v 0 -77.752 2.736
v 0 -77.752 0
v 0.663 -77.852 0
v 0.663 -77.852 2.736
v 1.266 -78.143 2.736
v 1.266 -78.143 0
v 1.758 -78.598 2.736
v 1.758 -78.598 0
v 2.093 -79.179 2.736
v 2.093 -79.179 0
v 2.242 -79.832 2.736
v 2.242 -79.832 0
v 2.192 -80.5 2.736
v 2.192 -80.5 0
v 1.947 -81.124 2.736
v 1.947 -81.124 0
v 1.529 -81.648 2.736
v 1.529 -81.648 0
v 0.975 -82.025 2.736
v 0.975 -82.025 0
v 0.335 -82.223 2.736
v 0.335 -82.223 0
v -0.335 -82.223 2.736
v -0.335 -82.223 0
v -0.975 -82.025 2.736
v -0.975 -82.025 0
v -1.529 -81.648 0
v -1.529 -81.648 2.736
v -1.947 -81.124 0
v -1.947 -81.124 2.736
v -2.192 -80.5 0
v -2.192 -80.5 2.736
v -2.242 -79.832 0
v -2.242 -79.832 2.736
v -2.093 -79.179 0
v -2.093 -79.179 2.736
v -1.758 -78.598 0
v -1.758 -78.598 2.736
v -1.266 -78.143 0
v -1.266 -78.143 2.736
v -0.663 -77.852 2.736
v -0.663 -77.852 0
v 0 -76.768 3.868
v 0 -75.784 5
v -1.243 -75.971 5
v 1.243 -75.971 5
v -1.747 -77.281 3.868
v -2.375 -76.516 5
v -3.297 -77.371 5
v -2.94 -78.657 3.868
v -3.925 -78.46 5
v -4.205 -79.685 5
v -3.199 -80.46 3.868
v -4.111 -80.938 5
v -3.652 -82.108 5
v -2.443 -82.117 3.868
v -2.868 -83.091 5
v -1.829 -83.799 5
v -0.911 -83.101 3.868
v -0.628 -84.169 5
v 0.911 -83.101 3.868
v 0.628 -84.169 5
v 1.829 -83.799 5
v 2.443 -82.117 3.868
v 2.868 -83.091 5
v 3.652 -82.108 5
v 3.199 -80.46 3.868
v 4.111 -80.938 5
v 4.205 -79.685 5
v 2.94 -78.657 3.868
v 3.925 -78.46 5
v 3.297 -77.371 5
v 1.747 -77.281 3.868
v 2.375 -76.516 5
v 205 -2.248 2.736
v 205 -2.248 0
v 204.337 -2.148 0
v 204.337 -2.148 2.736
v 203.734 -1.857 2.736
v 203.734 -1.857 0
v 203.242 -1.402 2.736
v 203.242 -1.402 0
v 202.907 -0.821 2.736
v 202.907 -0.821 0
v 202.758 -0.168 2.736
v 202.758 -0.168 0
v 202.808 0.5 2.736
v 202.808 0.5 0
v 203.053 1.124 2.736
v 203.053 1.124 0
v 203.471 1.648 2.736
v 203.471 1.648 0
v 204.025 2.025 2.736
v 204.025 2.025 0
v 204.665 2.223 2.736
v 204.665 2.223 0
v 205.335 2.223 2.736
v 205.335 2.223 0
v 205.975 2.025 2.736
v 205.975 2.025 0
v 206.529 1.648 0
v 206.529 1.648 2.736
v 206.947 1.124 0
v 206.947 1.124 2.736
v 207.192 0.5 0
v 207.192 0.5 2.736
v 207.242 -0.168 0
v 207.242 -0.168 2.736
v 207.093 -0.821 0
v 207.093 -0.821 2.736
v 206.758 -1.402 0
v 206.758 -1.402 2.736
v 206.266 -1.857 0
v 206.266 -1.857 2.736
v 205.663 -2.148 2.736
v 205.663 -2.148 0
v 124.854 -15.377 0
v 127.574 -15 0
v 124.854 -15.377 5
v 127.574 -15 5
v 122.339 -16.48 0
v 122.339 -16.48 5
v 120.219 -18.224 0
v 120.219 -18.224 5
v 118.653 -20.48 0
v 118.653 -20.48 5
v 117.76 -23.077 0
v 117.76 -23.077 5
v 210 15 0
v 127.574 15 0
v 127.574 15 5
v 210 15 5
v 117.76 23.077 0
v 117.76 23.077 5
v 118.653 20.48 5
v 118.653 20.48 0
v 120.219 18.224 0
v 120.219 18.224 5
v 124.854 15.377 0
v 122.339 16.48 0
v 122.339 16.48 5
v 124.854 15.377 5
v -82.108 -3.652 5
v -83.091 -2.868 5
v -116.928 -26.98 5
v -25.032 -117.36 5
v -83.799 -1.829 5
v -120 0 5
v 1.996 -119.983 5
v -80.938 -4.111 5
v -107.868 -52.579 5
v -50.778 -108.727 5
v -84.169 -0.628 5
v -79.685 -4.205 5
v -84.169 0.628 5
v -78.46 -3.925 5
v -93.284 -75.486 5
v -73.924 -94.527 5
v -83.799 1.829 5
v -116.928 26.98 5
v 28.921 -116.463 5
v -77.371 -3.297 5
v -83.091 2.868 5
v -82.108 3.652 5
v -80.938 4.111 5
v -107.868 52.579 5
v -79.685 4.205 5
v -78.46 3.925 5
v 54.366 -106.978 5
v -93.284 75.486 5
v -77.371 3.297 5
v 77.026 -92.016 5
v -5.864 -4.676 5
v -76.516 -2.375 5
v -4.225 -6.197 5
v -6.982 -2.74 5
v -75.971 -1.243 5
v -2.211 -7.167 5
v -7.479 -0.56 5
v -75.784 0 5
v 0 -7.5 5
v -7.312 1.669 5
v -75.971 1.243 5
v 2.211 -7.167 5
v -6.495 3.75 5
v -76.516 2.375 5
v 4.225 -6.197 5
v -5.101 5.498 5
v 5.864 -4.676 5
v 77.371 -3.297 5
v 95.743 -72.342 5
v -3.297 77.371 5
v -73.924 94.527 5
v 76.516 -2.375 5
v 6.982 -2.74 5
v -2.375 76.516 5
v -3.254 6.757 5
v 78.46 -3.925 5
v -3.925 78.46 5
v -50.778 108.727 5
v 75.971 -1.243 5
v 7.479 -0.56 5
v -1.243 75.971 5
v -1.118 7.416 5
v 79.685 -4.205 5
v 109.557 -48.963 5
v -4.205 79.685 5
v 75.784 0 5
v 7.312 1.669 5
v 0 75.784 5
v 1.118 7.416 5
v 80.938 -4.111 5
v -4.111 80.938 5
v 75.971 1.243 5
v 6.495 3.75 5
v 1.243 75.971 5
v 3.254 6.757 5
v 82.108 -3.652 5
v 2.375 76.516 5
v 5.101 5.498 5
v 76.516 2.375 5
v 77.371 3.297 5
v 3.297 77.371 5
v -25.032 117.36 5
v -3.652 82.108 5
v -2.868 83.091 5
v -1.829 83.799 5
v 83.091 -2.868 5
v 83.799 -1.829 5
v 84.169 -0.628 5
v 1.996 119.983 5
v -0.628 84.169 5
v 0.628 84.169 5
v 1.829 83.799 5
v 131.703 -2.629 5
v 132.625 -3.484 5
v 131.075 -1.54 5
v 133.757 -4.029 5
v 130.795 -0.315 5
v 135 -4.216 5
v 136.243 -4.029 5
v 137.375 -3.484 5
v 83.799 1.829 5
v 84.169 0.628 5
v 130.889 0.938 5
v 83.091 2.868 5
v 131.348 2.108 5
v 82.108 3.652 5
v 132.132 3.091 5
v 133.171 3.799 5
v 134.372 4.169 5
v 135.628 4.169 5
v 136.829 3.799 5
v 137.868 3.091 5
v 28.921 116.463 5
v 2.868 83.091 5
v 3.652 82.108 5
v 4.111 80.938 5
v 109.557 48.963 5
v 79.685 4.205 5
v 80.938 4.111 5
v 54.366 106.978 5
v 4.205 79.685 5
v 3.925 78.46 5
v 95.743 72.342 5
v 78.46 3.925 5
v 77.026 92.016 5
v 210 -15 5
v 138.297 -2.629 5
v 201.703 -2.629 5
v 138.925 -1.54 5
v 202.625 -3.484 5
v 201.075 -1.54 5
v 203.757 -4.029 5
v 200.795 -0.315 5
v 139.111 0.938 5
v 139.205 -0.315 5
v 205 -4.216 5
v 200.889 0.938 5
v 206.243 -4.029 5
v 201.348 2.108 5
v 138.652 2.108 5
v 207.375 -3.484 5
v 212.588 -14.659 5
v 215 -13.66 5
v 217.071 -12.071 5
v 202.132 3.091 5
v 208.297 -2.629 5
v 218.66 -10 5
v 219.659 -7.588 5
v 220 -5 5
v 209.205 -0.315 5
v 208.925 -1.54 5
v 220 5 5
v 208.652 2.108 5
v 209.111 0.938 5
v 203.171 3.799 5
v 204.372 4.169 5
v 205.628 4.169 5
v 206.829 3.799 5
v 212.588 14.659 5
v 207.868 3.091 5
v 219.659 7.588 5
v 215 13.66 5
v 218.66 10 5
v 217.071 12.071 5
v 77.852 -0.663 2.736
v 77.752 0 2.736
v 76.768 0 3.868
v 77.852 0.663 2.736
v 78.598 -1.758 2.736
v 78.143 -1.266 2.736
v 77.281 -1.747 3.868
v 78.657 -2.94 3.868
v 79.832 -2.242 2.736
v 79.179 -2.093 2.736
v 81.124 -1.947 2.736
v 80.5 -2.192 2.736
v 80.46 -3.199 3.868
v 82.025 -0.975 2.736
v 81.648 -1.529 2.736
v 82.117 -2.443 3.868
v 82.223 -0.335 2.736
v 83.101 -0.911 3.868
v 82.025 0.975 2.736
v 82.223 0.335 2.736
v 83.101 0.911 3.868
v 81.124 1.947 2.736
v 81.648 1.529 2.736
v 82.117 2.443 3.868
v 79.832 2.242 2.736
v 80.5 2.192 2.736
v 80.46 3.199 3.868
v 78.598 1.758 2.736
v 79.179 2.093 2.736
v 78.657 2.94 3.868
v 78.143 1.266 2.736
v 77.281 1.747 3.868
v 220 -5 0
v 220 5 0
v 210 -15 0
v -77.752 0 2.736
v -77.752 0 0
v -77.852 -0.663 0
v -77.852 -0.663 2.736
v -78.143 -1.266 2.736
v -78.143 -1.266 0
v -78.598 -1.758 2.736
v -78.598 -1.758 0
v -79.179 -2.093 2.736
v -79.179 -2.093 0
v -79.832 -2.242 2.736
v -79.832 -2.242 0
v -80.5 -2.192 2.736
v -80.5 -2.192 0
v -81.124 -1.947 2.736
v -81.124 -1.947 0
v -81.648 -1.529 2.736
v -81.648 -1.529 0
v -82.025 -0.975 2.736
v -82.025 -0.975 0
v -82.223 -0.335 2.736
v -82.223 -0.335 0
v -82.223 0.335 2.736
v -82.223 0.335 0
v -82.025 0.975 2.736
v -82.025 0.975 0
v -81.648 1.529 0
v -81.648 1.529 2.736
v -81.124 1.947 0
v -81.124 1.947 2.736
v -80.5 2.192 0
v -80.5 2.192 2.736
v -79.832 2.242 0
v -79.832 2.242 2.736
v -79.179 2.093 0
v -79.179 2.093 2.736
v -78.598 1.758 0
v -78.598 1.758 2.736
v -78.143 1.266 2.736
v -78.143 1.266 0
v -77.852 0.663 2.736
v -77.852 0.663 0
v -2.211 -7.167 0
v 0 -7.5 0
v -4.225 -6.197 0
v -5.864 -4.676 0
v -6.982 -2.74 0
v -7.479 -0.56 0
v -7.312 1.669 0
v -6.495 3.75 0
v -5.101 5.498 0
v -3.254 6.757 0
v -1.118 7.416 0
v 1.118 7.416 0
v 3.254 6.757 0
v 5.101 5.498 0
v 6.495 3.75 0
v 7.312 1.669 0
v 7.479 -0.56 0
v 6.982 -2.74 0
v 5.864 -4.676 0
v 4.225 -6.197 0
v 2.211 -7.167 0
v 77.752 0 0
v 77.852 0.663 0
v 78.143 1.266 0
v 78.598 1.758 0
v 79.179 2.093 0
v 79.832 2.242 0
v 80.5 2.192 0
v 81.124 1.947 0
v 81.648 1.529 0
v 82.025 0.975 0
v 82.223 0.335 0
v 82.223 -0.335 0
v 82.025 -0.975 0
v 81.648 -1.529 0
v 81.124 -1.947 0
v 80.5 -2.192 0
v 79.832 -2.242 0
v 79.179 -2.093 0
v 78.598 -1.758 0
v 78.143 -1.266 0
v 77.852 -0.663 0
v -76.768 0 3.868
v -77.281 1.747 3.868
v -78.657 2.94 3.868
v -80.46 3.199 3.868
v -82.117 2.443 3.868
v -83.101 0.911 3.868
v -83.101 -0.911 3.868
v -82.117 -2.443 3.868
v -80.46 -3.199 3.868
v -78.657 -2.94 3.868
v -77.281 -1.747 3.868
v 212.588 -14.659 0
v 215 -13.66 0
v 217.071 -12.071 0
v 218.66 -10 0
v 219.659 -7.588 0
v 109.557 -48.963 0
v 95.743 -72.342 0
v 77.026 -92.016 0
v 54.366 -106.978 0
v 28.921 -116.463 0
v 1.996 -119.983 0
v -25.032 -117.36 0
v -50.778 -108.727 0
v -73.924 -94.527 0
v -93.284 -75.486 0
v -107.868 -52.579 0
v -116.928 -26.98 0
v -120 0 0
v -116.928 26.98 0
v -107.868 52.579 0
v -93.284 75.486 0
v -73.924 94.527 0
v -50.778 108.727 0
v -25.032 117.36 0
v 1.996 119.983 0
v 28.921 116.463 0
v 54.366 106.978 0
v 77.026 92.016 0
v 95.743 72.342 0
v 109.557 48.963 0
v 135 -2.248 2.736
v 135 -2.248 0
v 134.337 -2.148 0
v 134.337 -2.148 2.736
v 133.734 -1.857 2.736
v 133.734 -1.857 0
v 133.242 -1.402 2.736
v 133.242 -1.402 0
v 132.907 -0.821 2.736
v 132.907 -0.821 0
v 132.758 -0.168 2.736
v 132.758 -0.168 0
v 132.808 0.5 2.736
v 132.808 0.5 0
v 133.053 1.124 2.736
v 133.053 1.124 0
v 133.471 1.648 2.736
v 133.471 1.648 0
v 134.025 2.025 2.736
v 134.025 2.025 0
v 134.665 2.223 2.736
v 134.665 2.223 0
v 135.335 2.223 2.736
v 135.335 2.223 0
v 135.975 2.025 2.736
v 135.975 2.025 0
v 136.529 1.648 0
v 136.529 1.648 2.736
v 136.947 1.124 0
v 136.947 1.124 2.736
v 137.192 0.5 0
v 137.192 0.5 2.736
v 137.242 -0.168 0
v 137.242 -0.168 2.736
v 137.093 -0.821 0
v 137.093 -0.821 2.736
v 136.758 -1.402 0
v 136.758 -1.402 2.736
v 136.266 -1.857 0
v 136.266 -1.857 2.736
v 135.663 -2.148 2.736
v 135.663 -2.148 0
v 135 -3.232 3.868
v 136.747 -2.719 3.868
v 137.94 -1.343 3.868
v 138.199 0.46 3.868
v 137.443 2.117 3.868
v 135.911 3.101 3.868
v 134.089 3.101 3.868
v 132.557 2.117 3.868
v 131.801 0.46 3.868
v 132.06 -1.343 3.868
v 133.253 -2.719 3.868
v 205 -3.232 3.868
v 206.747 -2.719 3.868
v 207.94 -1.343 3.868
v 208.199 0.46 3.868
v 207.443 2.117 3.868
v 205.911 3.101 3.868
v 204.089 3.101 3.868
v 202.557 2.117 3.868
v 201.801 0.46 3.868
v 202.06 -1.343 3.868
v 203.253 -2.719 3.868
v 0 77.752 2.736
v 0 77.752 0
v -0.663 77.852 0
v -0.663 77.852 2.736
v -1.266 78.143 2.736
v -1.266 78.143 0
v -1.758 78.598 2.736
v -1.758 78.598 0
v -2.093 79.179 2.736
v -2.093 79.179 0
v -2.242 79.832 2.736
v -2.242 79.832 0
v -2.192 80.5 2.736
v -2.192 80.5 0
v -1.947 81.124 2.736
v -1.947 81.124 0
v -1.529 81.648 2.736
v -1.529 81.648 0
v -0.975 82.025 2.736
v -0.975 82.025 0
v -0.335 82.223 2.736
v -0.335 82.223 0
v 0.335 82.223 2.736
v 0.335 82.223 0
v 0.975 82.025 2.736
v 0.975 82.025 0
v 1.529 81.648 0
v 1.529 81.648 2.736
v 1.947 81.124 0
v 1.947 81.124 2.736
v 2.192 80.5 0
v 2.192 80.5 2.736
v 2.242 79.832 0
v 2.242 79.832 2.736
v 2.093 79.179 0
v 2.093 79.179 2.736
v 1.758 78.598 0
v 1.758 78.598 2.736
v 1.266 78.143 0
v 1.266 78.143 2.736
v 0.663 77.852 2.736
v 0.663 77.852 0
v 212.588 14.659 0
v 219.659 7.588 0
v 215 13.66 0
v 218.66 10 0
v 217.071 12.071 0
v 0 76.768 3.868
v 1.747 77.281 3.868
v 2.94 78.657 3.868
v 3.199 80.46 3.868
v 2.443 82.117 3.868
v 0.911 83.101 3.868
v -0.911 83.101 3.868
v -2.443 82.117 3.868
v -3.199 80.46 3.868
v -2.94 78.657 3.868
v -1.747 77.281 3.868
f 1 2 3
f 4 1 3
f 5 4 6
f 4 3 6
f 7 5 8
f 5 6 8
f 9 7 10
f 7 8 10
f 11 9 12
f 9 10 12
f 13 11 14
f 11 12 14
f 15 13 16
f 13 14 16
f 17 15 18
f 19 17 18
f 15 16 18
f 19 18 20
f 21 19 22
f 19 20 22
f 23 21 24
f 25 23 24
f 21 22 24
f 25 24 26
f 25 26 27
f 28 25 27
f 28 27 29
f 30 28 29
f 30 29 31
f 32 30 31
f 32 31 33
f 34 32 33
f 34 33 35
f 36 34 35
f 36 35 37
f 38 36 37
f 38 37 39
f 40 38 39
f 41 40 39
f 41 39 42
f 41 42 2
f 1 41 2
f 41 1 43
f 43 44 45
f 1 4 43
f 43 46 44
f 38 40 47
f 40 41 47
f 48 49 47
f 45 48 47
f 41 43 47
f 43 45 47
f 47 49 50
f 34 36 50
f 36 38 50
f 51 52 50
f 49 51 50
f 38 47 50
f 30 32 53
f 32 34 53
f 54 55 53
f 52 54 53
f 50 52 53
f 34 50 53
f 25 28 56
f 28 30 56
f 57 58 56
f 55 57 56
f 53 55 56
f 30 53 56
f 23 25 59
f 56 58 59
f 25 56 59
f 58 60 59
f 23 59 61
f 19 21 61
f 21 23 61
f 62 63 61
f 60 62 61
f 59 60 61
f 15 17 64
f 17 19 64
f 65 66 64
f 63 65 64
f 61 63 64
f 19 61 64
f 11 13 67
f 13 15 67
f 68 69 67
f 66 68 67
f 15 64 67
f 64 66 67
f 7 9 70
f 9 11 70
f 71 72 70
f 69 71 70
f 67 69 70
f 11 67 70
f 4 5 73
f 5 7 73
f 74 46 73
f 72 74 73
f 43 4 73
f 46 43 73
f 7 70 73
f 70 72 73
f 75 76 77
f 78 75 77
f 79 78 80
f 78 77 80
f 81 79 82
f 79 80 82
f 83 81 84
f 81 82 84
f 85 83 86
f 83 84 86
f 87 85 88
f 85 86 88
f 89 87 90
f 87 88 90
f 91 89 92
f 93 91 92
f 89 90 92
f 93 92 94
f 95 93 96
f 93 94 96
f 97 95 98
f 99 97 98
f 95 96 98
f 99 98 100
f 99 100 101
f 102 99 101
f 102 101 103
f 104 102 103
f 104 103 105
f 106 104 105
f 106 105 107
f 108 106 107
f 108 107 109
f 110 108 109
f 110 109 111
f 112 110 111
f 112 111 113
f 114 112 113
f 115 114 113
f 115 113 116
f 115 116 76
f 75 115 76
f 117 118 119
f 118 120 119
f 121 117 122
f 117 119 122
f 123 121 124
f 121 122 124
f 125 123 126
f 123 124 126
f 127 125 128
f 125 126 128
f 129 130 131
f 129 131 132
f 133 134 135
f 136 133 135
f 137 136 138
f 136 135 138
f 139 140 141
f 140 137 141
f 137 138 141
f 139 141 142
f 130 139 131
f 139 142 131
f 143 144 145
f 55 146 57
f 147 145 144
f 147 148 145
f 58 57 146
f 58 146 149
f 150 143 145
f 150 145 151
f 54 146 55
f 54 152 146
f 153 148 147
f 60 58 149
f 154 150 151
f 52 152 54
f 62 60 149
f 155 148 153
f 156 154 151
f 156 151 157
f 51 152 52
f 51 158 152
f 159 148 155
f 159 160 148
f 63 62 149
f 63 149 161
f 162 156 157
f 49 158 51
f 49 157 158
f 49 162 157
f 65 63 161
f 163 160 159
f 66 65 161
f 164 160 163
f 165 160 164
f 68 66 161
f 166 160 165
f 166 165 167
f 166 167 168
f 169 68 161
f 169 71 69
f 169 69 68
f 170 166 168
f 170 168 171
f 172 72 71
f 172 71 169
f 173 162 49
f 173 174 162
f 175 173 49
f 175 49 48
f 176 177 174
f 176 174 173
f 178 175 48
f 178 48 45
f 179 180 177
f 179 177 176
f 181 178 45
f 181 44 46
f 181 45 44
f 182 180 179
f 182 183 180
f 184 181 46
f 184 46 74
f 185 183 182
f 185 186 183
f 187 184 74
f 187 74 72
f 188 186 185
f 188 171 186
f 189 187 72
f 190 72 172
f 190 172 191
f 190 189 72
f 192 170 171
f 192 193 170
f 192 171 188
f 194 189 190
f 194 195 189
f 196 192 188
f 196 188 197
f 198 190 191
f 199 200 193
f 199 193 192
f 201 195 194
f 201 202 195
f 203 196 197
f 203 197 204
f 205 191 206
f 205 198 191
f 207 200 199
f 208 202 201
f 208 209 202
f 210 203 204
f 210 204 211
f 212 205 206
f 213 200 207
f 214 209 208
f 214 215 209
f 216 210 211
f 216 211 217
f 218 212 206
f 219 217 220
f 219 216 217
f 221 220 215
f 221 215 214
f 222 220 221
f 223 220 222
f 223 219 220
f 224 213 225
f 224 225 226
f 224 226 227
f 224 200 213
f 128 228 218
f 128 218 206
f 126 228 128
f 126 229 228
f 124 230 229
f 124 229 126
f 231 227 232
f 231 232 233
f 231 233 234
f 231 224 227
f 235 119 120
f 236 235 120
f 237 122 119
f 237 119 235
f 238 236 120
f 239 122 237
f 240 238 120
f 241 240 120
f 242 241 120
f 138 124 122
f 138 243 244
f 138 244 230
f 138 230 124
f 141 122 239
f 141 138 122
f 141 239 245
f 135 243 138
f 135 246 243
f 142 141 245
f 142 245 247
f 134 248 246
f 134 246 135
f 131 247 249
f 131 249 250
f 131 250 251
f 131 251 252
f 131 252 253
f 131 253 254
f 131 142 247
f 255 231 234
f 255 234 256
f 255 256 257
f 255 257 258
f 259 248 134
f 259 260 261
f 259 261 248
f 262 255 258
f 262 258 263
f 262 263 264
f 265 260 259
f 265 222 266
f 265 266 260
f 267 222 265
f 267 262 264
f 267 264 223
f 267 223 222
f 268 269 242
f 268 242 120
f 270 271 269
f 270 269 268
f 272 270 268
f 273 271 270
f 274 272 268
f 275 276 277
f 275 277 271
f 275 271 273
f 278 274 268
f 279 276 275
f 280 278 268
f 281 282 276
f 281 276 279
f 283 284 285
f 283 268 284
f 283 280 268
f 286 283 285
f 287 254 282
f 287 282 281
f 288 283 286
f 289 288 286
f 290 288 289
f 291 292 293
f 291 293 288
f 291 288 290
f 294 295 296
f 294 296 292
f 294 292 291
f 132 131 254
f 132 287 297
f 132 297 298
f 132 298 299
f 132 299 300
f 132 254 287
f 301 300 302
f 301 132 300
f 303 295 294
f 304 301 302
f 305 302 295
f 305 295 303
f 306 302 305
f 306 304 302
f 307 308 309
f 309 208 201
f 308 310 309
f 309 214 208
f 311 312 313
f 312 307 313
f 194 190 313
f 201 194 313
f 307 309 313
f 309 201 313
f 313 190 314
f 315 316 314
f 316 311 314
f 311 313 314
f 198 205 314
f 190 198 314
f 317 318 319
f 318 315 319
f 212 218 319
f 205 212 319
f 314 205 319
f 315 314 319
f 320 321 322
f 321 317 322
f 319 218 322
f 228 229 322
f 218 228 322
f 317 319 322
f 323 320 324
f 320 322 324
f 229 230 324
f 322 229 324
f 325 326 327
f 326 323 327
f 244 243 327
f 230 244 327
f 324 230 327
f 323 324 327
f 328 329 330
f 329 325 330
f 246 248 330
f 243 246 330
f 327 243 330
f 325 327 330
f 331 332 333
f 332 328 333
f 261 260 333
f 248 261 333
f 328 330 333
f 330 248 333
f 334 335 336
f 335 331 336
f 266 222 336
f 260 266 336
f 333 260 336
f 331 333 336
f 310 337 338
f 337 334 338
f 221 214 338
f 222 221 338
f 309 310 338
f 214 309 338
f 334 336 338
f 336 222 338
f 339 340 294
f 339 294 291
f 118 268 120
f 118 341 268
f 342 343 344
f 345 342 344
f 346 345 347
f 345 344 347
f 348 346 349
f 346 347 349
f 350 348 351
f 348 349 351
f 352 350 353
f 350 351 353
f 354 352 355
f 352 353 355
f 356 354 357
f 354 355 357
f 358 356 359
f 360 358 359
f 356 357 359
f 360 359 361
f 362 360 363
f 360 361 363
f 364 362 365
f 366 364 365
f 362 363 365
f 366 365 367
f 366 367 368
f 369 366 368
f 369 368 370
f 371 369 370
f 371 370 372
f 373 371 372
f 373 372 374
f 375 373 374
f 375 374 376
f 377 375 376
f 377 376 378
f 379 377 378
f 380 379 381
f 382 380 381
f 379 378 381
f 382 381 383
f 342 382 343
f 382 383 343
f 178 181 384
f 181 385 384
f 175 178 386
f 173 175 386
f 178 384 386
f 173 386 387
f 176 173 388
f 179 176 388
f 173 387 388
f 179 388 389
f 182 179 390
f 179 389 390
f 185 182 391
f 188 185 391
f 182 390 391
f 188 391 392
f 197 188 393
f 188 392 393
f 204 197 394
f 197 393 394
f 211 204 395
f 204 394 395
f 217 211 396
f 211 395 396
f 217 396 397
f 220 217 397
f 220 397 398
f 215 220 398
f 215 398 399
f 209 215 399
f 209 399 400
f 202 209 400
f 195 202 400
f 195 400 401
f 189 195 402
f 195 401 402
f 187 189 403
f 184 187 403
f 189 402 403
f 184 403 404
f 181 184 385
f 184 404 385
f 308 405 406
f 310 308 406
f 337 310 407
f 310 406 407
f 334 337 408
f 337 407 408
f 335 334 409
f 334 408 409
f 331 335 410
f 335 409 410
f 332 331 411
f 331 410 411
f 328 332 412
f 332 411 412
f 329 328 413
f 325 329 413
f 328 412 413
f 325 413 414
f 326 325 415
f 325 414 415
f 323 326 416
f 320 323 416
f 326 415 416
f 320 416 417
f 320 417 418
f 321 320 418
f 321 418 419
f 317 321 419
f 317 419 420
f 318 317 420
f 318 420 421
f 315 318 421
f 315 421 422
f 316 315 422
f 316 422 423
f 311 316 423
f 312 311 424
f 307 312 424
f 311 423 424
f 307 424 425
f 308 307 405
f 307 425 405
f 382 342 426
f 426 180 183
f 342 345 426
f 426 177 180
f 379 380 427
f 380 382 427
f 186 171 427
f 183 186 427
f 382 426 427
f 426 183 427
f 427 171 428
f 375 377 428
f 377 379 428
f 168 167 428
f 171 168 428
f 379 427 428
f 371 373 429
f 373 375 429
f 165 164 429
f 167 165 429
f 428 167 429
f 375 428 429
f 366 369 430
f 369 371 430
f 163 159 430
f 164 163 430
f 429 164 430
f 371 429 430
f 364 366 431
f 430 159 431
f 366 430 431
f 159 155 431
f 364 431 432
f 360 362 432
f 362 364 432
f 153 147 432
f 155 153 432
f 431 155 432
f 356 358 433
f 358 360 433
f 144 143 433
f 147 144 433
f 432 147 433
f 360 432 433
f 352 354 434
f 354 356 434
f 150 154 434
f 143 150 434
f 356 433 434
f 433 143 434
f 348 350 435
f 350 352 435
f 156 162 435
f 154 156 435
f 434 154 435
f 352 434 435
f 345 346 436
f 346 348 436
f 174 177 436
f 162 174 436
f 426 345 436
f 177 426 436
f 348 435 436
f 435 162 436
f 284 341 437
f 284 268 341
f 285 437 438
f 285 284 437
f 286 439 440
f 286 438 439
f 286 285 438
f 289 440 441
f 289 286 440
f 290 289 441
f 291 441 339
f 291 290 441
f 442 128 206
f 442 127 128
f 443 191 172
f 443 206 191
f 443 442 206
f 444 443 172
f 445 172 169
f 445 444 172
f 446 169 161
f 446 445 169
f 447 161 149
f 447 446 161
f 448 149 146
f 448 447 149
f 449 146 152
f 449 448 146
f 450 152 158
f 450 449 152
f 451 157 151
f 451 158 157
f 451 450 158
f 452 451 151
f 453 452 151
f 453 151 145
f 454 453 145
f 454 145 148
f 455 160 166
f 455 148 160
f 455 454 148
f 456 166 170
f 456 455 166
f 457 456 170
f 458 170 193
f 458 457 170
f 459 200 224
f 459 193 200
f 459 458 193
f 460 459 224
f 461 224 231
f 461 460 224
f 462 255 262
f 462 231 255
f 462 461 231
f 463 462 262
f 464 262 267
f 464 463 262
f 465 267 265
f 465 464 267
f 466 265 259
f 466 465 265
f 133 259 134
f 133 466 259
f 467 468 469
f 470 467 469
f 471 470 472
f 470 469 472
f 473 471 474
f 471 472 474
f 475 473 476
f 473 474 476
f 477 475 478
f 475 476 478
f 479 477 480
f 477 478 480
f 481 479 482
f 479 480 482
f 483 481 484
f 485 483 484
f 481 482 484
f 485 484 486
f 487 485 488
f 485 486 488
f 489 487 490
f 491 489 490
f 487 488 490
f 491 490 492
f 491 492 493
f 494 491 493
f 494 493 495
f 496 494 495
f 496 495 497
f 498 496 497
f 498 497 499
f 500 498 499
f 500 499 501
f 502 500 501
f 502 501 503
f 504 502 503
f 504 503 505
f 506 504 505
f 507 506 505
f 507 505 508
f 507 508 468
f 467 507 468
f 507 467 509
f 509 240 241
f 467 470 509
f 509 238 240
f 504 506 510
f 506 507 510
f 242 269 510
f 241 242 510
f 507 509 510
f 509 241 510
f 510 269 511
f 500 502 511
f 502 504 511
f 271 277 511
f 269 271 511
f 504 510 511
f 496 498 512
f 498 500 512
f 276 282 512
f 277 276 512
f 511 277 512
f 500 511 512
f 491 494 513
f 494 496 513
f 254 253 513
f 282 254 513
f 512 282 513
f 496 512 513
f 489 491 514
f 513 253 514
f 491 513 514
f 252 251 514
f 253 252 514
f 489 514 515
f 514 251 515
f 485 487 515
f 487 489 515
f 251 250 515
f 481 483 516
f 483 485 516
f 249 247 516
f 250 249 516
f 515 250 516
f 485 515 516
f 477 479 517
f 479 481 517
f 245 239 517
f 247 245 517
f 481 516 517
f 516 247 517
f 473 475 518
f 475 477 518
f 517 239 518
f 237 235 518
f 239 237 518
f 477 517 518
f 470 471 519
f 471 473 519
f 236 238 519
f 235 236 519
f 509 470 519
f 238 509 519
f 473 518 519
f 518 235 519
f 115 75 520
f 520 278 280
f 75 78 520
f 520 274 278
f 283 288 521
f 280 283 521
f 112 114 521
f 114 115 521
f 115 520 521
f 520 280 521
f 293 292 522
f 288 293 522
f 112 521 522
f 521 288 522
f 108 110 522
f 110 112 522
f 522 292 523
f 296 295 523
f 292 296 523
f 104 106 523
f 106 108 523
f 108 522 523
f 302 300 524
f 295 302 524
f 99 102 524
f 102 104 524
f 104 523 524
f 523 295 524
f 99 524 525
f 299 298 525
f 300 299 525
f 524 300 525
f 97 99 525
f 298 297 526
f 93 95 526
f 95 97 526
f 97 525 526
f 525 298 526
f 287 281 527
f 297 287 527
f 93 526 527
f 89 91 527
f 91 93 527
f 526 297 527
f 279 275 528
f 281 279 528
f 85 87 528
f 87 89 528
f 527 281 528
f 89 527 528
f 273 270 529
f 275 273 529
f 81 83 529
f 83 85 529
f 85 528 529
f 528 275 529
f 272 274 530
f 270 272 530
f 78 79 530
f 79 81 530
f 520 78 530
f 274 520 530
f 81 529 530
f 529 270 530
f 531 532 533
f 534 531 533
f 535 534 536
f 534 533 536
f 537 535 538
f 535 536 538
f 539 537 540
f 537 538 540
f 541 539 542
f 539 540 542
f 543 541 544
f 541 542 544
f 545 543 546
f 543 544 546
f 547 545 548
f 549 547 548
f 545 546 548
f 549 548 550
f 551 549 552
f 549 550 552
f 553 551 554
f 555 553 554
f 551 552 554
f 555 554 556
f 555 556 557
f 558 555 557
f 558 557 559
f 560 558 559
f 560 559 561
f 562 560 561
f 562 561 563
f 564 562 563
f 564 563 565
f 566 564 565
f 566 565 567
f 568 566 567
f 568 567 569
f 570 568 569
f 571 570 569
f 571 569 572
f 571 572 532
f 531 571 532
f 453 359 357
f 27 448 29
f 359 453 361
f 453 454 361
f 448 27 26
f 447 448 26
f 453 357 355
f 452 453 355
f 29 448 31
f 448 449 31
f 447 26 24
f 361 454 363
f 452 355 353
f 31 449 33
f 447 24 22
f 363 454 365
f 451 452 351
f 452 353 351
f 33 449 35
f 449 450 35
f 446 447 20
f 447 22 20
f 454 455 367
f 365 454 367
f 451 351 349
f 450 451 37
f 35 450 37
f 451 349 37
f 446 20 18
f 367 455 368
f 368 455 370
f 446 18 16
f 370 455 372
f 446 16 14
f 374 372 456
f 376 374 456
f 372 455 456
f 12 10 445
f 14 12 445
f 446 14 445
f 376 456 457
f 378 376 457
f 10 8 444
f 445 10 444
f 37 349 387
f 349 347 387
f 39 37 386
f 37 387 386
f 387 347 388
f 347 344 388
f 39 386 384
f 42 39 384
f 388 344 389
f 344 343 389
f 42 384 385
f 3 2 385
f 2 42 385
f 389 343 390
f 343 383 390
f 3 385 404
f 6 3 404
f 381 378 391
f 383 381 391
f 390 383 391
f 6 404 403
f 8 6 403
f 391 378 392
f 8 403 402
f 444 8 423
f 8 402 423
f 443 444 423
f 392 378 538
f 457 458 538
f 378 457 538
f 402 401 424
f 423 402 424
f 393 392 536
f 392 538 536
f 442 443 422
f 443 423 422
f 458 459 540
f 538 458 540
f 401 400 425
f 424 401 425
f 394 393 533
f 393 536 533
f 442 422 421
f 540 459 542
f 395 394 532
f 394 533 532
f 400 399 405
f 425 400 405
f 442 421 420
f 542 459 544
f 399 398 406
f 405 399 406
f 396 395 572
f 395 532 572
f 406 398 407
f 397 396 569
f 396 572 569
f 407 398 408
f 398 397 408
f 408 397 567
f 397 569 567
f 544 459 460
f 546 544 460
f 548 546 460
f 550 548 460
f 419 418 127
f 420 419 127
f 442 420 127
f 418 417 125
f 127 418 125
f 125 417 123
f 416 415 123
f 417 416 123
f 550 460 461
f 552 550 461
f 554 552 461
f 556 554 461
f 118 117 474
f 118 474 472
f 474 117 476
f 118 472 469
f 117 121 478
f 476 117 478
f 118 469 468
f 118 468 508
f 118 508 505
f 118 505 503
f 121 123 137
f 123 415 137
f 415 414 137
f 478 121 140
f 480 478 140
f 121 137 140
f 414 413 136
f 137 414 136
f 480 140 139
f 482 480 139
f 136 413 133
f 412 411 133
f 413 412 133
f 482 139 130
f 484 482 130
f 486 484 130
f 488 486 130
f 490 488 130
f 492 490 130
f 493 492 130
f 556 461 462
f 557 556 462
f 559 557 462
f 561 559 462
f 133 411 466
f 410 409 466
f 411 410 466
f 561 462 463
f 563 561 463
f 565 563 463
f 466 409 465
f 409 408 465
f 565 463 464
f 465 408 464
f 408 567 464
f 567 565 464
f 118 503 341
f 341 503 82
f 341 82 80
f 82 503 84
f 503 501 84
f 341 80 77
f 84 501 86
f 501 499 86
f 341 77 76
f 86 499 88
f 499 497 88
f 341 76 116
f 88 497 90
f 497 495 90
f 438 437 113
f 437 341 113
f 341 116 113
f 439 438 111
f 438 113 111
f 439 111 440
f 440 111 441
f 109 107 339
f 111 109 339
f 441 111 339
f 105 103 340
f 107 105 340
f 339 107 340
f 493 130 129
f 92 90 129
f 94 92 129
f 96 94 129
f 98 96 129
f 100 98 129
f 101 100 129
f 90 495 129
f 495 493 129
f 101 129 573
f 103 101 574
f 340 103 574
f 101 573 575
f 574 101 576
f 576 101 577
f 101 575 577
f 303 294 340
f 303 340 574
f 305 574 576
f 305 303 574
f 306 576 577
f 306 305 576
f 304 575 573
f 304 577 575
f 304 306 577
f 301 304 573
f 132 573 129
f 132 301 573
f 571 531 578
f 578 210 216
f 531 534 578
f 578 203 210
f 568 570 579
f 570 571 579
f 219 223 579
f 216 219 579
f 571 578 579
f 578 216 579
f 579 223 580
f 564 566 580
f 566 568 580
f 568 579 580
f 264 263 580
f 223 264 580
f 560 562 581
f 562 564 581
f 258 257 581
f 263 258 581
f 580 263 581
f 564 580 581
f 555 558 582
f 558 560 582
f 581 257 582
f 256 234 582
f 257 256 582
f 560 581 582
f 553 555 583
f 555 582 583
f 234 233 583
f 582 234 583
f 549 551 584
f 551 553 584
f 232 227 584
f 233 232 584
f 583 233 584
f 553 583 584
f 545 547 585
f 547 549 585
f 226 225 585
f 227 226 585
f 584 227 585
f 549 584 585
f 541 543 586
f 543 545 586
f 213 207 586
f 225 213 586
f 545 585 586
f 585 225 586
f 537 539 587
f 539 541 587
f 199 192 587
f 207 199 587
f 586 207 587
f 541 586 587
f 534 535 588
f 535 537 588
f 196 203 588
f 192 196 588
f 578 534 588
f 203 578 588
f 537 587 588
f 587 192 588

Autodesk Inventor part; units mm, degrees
ref_plane "YZ Plane" through (0, 0, 0) normal (1, 0, 0) x (0, 1, 0)
ref_plane "XZ Plane" through (0, 0, 0) normal (0, 1, 0) x (-1, 0, 0)
ref_plane "XY Plane" through (0, 0, 0) normal (0, 0, 1) x (1, 0, 0)
sketch "Sketch1" plane through (0, 0, 0) normal (0, 0, 1) x (1, 0, 0)
  circle A0 centre (0, 0) radius 120
  line L0 (100, 15) -> (220, 15)
  line L1 (220, 15) -> (220, -15)
  line L2 (220, -15) -> (100, -15)
  line L3 (100, -15) -> (100, 15)
  dimension "d0" = 240
  dimension "d1" = 30
  dimension "d2" = 15
  dimension "d3" = 100
  dimension "d4" = 220
extrude "Extrusion1" add sketch "Sketch1" along normal blind 5
fillet "Fillet1" radius 10 4 edges at (119.0588, -15, 2.5) (119.0588, 15, 2.5) (220, -15, 2.5) (220, 15, 2.5)
sketch "Sketch2" plane through (0, 0, 5) normal (0, 0, 1) x (1, 0, 0)
  line L0 (220, -5) -> (220, 5) projected
  point P0 (0, 0)
  point P1 (135, 0)
  point P2 (205, 0)
  point P3 (220, 0)
  dimension "d8" = 15
  dimension "d9" = 70
hole "Hole1" at (135, 0, 5) at (205, 0, 5) direction (0, 0, -1) diameter 4.496 end through all countersink diameter 8.433 countersink angle 82 clearance for "Flat Head Machine Screw (82)" size "#8" standard "Ansi Unified Screw Threads"
sketch "Sketch3" plane through (0, 0, 5) normal (0, 0, 1) x (1, 0, 0)
  point P0 (0, 0)
  point P1 (0, 80)
  dimension "d17" = 80
hole "Hole2" at (0, 80, 5) direction (0, 0, -1) diameter 4.496 end through all countersink diameter 8.433 countersink angle 82 clearance for "Flat Head Machine Screw (82)" size "#8" standard "Ansi Unified Screw Threads"
pattern_circular "Circular Pattern1" count 4 over 360 about axis through (0, 0, -10) along (0, 0, 1) of "Hole2"
sketch "Sketch4" plane through (0, 0, 5) normal (0, 0, 1) x (1, 0, 0)
  point P0 (0, 0)
  point P1 (0, 0)
hole "Hole3" at (0, 0, 5) direction (0, 0, -1) diameter 15 end through all
equation "\"d2\" = 0.5 * d1"
properties part number "Top_Lever Side" material "Wood (Oak)"
